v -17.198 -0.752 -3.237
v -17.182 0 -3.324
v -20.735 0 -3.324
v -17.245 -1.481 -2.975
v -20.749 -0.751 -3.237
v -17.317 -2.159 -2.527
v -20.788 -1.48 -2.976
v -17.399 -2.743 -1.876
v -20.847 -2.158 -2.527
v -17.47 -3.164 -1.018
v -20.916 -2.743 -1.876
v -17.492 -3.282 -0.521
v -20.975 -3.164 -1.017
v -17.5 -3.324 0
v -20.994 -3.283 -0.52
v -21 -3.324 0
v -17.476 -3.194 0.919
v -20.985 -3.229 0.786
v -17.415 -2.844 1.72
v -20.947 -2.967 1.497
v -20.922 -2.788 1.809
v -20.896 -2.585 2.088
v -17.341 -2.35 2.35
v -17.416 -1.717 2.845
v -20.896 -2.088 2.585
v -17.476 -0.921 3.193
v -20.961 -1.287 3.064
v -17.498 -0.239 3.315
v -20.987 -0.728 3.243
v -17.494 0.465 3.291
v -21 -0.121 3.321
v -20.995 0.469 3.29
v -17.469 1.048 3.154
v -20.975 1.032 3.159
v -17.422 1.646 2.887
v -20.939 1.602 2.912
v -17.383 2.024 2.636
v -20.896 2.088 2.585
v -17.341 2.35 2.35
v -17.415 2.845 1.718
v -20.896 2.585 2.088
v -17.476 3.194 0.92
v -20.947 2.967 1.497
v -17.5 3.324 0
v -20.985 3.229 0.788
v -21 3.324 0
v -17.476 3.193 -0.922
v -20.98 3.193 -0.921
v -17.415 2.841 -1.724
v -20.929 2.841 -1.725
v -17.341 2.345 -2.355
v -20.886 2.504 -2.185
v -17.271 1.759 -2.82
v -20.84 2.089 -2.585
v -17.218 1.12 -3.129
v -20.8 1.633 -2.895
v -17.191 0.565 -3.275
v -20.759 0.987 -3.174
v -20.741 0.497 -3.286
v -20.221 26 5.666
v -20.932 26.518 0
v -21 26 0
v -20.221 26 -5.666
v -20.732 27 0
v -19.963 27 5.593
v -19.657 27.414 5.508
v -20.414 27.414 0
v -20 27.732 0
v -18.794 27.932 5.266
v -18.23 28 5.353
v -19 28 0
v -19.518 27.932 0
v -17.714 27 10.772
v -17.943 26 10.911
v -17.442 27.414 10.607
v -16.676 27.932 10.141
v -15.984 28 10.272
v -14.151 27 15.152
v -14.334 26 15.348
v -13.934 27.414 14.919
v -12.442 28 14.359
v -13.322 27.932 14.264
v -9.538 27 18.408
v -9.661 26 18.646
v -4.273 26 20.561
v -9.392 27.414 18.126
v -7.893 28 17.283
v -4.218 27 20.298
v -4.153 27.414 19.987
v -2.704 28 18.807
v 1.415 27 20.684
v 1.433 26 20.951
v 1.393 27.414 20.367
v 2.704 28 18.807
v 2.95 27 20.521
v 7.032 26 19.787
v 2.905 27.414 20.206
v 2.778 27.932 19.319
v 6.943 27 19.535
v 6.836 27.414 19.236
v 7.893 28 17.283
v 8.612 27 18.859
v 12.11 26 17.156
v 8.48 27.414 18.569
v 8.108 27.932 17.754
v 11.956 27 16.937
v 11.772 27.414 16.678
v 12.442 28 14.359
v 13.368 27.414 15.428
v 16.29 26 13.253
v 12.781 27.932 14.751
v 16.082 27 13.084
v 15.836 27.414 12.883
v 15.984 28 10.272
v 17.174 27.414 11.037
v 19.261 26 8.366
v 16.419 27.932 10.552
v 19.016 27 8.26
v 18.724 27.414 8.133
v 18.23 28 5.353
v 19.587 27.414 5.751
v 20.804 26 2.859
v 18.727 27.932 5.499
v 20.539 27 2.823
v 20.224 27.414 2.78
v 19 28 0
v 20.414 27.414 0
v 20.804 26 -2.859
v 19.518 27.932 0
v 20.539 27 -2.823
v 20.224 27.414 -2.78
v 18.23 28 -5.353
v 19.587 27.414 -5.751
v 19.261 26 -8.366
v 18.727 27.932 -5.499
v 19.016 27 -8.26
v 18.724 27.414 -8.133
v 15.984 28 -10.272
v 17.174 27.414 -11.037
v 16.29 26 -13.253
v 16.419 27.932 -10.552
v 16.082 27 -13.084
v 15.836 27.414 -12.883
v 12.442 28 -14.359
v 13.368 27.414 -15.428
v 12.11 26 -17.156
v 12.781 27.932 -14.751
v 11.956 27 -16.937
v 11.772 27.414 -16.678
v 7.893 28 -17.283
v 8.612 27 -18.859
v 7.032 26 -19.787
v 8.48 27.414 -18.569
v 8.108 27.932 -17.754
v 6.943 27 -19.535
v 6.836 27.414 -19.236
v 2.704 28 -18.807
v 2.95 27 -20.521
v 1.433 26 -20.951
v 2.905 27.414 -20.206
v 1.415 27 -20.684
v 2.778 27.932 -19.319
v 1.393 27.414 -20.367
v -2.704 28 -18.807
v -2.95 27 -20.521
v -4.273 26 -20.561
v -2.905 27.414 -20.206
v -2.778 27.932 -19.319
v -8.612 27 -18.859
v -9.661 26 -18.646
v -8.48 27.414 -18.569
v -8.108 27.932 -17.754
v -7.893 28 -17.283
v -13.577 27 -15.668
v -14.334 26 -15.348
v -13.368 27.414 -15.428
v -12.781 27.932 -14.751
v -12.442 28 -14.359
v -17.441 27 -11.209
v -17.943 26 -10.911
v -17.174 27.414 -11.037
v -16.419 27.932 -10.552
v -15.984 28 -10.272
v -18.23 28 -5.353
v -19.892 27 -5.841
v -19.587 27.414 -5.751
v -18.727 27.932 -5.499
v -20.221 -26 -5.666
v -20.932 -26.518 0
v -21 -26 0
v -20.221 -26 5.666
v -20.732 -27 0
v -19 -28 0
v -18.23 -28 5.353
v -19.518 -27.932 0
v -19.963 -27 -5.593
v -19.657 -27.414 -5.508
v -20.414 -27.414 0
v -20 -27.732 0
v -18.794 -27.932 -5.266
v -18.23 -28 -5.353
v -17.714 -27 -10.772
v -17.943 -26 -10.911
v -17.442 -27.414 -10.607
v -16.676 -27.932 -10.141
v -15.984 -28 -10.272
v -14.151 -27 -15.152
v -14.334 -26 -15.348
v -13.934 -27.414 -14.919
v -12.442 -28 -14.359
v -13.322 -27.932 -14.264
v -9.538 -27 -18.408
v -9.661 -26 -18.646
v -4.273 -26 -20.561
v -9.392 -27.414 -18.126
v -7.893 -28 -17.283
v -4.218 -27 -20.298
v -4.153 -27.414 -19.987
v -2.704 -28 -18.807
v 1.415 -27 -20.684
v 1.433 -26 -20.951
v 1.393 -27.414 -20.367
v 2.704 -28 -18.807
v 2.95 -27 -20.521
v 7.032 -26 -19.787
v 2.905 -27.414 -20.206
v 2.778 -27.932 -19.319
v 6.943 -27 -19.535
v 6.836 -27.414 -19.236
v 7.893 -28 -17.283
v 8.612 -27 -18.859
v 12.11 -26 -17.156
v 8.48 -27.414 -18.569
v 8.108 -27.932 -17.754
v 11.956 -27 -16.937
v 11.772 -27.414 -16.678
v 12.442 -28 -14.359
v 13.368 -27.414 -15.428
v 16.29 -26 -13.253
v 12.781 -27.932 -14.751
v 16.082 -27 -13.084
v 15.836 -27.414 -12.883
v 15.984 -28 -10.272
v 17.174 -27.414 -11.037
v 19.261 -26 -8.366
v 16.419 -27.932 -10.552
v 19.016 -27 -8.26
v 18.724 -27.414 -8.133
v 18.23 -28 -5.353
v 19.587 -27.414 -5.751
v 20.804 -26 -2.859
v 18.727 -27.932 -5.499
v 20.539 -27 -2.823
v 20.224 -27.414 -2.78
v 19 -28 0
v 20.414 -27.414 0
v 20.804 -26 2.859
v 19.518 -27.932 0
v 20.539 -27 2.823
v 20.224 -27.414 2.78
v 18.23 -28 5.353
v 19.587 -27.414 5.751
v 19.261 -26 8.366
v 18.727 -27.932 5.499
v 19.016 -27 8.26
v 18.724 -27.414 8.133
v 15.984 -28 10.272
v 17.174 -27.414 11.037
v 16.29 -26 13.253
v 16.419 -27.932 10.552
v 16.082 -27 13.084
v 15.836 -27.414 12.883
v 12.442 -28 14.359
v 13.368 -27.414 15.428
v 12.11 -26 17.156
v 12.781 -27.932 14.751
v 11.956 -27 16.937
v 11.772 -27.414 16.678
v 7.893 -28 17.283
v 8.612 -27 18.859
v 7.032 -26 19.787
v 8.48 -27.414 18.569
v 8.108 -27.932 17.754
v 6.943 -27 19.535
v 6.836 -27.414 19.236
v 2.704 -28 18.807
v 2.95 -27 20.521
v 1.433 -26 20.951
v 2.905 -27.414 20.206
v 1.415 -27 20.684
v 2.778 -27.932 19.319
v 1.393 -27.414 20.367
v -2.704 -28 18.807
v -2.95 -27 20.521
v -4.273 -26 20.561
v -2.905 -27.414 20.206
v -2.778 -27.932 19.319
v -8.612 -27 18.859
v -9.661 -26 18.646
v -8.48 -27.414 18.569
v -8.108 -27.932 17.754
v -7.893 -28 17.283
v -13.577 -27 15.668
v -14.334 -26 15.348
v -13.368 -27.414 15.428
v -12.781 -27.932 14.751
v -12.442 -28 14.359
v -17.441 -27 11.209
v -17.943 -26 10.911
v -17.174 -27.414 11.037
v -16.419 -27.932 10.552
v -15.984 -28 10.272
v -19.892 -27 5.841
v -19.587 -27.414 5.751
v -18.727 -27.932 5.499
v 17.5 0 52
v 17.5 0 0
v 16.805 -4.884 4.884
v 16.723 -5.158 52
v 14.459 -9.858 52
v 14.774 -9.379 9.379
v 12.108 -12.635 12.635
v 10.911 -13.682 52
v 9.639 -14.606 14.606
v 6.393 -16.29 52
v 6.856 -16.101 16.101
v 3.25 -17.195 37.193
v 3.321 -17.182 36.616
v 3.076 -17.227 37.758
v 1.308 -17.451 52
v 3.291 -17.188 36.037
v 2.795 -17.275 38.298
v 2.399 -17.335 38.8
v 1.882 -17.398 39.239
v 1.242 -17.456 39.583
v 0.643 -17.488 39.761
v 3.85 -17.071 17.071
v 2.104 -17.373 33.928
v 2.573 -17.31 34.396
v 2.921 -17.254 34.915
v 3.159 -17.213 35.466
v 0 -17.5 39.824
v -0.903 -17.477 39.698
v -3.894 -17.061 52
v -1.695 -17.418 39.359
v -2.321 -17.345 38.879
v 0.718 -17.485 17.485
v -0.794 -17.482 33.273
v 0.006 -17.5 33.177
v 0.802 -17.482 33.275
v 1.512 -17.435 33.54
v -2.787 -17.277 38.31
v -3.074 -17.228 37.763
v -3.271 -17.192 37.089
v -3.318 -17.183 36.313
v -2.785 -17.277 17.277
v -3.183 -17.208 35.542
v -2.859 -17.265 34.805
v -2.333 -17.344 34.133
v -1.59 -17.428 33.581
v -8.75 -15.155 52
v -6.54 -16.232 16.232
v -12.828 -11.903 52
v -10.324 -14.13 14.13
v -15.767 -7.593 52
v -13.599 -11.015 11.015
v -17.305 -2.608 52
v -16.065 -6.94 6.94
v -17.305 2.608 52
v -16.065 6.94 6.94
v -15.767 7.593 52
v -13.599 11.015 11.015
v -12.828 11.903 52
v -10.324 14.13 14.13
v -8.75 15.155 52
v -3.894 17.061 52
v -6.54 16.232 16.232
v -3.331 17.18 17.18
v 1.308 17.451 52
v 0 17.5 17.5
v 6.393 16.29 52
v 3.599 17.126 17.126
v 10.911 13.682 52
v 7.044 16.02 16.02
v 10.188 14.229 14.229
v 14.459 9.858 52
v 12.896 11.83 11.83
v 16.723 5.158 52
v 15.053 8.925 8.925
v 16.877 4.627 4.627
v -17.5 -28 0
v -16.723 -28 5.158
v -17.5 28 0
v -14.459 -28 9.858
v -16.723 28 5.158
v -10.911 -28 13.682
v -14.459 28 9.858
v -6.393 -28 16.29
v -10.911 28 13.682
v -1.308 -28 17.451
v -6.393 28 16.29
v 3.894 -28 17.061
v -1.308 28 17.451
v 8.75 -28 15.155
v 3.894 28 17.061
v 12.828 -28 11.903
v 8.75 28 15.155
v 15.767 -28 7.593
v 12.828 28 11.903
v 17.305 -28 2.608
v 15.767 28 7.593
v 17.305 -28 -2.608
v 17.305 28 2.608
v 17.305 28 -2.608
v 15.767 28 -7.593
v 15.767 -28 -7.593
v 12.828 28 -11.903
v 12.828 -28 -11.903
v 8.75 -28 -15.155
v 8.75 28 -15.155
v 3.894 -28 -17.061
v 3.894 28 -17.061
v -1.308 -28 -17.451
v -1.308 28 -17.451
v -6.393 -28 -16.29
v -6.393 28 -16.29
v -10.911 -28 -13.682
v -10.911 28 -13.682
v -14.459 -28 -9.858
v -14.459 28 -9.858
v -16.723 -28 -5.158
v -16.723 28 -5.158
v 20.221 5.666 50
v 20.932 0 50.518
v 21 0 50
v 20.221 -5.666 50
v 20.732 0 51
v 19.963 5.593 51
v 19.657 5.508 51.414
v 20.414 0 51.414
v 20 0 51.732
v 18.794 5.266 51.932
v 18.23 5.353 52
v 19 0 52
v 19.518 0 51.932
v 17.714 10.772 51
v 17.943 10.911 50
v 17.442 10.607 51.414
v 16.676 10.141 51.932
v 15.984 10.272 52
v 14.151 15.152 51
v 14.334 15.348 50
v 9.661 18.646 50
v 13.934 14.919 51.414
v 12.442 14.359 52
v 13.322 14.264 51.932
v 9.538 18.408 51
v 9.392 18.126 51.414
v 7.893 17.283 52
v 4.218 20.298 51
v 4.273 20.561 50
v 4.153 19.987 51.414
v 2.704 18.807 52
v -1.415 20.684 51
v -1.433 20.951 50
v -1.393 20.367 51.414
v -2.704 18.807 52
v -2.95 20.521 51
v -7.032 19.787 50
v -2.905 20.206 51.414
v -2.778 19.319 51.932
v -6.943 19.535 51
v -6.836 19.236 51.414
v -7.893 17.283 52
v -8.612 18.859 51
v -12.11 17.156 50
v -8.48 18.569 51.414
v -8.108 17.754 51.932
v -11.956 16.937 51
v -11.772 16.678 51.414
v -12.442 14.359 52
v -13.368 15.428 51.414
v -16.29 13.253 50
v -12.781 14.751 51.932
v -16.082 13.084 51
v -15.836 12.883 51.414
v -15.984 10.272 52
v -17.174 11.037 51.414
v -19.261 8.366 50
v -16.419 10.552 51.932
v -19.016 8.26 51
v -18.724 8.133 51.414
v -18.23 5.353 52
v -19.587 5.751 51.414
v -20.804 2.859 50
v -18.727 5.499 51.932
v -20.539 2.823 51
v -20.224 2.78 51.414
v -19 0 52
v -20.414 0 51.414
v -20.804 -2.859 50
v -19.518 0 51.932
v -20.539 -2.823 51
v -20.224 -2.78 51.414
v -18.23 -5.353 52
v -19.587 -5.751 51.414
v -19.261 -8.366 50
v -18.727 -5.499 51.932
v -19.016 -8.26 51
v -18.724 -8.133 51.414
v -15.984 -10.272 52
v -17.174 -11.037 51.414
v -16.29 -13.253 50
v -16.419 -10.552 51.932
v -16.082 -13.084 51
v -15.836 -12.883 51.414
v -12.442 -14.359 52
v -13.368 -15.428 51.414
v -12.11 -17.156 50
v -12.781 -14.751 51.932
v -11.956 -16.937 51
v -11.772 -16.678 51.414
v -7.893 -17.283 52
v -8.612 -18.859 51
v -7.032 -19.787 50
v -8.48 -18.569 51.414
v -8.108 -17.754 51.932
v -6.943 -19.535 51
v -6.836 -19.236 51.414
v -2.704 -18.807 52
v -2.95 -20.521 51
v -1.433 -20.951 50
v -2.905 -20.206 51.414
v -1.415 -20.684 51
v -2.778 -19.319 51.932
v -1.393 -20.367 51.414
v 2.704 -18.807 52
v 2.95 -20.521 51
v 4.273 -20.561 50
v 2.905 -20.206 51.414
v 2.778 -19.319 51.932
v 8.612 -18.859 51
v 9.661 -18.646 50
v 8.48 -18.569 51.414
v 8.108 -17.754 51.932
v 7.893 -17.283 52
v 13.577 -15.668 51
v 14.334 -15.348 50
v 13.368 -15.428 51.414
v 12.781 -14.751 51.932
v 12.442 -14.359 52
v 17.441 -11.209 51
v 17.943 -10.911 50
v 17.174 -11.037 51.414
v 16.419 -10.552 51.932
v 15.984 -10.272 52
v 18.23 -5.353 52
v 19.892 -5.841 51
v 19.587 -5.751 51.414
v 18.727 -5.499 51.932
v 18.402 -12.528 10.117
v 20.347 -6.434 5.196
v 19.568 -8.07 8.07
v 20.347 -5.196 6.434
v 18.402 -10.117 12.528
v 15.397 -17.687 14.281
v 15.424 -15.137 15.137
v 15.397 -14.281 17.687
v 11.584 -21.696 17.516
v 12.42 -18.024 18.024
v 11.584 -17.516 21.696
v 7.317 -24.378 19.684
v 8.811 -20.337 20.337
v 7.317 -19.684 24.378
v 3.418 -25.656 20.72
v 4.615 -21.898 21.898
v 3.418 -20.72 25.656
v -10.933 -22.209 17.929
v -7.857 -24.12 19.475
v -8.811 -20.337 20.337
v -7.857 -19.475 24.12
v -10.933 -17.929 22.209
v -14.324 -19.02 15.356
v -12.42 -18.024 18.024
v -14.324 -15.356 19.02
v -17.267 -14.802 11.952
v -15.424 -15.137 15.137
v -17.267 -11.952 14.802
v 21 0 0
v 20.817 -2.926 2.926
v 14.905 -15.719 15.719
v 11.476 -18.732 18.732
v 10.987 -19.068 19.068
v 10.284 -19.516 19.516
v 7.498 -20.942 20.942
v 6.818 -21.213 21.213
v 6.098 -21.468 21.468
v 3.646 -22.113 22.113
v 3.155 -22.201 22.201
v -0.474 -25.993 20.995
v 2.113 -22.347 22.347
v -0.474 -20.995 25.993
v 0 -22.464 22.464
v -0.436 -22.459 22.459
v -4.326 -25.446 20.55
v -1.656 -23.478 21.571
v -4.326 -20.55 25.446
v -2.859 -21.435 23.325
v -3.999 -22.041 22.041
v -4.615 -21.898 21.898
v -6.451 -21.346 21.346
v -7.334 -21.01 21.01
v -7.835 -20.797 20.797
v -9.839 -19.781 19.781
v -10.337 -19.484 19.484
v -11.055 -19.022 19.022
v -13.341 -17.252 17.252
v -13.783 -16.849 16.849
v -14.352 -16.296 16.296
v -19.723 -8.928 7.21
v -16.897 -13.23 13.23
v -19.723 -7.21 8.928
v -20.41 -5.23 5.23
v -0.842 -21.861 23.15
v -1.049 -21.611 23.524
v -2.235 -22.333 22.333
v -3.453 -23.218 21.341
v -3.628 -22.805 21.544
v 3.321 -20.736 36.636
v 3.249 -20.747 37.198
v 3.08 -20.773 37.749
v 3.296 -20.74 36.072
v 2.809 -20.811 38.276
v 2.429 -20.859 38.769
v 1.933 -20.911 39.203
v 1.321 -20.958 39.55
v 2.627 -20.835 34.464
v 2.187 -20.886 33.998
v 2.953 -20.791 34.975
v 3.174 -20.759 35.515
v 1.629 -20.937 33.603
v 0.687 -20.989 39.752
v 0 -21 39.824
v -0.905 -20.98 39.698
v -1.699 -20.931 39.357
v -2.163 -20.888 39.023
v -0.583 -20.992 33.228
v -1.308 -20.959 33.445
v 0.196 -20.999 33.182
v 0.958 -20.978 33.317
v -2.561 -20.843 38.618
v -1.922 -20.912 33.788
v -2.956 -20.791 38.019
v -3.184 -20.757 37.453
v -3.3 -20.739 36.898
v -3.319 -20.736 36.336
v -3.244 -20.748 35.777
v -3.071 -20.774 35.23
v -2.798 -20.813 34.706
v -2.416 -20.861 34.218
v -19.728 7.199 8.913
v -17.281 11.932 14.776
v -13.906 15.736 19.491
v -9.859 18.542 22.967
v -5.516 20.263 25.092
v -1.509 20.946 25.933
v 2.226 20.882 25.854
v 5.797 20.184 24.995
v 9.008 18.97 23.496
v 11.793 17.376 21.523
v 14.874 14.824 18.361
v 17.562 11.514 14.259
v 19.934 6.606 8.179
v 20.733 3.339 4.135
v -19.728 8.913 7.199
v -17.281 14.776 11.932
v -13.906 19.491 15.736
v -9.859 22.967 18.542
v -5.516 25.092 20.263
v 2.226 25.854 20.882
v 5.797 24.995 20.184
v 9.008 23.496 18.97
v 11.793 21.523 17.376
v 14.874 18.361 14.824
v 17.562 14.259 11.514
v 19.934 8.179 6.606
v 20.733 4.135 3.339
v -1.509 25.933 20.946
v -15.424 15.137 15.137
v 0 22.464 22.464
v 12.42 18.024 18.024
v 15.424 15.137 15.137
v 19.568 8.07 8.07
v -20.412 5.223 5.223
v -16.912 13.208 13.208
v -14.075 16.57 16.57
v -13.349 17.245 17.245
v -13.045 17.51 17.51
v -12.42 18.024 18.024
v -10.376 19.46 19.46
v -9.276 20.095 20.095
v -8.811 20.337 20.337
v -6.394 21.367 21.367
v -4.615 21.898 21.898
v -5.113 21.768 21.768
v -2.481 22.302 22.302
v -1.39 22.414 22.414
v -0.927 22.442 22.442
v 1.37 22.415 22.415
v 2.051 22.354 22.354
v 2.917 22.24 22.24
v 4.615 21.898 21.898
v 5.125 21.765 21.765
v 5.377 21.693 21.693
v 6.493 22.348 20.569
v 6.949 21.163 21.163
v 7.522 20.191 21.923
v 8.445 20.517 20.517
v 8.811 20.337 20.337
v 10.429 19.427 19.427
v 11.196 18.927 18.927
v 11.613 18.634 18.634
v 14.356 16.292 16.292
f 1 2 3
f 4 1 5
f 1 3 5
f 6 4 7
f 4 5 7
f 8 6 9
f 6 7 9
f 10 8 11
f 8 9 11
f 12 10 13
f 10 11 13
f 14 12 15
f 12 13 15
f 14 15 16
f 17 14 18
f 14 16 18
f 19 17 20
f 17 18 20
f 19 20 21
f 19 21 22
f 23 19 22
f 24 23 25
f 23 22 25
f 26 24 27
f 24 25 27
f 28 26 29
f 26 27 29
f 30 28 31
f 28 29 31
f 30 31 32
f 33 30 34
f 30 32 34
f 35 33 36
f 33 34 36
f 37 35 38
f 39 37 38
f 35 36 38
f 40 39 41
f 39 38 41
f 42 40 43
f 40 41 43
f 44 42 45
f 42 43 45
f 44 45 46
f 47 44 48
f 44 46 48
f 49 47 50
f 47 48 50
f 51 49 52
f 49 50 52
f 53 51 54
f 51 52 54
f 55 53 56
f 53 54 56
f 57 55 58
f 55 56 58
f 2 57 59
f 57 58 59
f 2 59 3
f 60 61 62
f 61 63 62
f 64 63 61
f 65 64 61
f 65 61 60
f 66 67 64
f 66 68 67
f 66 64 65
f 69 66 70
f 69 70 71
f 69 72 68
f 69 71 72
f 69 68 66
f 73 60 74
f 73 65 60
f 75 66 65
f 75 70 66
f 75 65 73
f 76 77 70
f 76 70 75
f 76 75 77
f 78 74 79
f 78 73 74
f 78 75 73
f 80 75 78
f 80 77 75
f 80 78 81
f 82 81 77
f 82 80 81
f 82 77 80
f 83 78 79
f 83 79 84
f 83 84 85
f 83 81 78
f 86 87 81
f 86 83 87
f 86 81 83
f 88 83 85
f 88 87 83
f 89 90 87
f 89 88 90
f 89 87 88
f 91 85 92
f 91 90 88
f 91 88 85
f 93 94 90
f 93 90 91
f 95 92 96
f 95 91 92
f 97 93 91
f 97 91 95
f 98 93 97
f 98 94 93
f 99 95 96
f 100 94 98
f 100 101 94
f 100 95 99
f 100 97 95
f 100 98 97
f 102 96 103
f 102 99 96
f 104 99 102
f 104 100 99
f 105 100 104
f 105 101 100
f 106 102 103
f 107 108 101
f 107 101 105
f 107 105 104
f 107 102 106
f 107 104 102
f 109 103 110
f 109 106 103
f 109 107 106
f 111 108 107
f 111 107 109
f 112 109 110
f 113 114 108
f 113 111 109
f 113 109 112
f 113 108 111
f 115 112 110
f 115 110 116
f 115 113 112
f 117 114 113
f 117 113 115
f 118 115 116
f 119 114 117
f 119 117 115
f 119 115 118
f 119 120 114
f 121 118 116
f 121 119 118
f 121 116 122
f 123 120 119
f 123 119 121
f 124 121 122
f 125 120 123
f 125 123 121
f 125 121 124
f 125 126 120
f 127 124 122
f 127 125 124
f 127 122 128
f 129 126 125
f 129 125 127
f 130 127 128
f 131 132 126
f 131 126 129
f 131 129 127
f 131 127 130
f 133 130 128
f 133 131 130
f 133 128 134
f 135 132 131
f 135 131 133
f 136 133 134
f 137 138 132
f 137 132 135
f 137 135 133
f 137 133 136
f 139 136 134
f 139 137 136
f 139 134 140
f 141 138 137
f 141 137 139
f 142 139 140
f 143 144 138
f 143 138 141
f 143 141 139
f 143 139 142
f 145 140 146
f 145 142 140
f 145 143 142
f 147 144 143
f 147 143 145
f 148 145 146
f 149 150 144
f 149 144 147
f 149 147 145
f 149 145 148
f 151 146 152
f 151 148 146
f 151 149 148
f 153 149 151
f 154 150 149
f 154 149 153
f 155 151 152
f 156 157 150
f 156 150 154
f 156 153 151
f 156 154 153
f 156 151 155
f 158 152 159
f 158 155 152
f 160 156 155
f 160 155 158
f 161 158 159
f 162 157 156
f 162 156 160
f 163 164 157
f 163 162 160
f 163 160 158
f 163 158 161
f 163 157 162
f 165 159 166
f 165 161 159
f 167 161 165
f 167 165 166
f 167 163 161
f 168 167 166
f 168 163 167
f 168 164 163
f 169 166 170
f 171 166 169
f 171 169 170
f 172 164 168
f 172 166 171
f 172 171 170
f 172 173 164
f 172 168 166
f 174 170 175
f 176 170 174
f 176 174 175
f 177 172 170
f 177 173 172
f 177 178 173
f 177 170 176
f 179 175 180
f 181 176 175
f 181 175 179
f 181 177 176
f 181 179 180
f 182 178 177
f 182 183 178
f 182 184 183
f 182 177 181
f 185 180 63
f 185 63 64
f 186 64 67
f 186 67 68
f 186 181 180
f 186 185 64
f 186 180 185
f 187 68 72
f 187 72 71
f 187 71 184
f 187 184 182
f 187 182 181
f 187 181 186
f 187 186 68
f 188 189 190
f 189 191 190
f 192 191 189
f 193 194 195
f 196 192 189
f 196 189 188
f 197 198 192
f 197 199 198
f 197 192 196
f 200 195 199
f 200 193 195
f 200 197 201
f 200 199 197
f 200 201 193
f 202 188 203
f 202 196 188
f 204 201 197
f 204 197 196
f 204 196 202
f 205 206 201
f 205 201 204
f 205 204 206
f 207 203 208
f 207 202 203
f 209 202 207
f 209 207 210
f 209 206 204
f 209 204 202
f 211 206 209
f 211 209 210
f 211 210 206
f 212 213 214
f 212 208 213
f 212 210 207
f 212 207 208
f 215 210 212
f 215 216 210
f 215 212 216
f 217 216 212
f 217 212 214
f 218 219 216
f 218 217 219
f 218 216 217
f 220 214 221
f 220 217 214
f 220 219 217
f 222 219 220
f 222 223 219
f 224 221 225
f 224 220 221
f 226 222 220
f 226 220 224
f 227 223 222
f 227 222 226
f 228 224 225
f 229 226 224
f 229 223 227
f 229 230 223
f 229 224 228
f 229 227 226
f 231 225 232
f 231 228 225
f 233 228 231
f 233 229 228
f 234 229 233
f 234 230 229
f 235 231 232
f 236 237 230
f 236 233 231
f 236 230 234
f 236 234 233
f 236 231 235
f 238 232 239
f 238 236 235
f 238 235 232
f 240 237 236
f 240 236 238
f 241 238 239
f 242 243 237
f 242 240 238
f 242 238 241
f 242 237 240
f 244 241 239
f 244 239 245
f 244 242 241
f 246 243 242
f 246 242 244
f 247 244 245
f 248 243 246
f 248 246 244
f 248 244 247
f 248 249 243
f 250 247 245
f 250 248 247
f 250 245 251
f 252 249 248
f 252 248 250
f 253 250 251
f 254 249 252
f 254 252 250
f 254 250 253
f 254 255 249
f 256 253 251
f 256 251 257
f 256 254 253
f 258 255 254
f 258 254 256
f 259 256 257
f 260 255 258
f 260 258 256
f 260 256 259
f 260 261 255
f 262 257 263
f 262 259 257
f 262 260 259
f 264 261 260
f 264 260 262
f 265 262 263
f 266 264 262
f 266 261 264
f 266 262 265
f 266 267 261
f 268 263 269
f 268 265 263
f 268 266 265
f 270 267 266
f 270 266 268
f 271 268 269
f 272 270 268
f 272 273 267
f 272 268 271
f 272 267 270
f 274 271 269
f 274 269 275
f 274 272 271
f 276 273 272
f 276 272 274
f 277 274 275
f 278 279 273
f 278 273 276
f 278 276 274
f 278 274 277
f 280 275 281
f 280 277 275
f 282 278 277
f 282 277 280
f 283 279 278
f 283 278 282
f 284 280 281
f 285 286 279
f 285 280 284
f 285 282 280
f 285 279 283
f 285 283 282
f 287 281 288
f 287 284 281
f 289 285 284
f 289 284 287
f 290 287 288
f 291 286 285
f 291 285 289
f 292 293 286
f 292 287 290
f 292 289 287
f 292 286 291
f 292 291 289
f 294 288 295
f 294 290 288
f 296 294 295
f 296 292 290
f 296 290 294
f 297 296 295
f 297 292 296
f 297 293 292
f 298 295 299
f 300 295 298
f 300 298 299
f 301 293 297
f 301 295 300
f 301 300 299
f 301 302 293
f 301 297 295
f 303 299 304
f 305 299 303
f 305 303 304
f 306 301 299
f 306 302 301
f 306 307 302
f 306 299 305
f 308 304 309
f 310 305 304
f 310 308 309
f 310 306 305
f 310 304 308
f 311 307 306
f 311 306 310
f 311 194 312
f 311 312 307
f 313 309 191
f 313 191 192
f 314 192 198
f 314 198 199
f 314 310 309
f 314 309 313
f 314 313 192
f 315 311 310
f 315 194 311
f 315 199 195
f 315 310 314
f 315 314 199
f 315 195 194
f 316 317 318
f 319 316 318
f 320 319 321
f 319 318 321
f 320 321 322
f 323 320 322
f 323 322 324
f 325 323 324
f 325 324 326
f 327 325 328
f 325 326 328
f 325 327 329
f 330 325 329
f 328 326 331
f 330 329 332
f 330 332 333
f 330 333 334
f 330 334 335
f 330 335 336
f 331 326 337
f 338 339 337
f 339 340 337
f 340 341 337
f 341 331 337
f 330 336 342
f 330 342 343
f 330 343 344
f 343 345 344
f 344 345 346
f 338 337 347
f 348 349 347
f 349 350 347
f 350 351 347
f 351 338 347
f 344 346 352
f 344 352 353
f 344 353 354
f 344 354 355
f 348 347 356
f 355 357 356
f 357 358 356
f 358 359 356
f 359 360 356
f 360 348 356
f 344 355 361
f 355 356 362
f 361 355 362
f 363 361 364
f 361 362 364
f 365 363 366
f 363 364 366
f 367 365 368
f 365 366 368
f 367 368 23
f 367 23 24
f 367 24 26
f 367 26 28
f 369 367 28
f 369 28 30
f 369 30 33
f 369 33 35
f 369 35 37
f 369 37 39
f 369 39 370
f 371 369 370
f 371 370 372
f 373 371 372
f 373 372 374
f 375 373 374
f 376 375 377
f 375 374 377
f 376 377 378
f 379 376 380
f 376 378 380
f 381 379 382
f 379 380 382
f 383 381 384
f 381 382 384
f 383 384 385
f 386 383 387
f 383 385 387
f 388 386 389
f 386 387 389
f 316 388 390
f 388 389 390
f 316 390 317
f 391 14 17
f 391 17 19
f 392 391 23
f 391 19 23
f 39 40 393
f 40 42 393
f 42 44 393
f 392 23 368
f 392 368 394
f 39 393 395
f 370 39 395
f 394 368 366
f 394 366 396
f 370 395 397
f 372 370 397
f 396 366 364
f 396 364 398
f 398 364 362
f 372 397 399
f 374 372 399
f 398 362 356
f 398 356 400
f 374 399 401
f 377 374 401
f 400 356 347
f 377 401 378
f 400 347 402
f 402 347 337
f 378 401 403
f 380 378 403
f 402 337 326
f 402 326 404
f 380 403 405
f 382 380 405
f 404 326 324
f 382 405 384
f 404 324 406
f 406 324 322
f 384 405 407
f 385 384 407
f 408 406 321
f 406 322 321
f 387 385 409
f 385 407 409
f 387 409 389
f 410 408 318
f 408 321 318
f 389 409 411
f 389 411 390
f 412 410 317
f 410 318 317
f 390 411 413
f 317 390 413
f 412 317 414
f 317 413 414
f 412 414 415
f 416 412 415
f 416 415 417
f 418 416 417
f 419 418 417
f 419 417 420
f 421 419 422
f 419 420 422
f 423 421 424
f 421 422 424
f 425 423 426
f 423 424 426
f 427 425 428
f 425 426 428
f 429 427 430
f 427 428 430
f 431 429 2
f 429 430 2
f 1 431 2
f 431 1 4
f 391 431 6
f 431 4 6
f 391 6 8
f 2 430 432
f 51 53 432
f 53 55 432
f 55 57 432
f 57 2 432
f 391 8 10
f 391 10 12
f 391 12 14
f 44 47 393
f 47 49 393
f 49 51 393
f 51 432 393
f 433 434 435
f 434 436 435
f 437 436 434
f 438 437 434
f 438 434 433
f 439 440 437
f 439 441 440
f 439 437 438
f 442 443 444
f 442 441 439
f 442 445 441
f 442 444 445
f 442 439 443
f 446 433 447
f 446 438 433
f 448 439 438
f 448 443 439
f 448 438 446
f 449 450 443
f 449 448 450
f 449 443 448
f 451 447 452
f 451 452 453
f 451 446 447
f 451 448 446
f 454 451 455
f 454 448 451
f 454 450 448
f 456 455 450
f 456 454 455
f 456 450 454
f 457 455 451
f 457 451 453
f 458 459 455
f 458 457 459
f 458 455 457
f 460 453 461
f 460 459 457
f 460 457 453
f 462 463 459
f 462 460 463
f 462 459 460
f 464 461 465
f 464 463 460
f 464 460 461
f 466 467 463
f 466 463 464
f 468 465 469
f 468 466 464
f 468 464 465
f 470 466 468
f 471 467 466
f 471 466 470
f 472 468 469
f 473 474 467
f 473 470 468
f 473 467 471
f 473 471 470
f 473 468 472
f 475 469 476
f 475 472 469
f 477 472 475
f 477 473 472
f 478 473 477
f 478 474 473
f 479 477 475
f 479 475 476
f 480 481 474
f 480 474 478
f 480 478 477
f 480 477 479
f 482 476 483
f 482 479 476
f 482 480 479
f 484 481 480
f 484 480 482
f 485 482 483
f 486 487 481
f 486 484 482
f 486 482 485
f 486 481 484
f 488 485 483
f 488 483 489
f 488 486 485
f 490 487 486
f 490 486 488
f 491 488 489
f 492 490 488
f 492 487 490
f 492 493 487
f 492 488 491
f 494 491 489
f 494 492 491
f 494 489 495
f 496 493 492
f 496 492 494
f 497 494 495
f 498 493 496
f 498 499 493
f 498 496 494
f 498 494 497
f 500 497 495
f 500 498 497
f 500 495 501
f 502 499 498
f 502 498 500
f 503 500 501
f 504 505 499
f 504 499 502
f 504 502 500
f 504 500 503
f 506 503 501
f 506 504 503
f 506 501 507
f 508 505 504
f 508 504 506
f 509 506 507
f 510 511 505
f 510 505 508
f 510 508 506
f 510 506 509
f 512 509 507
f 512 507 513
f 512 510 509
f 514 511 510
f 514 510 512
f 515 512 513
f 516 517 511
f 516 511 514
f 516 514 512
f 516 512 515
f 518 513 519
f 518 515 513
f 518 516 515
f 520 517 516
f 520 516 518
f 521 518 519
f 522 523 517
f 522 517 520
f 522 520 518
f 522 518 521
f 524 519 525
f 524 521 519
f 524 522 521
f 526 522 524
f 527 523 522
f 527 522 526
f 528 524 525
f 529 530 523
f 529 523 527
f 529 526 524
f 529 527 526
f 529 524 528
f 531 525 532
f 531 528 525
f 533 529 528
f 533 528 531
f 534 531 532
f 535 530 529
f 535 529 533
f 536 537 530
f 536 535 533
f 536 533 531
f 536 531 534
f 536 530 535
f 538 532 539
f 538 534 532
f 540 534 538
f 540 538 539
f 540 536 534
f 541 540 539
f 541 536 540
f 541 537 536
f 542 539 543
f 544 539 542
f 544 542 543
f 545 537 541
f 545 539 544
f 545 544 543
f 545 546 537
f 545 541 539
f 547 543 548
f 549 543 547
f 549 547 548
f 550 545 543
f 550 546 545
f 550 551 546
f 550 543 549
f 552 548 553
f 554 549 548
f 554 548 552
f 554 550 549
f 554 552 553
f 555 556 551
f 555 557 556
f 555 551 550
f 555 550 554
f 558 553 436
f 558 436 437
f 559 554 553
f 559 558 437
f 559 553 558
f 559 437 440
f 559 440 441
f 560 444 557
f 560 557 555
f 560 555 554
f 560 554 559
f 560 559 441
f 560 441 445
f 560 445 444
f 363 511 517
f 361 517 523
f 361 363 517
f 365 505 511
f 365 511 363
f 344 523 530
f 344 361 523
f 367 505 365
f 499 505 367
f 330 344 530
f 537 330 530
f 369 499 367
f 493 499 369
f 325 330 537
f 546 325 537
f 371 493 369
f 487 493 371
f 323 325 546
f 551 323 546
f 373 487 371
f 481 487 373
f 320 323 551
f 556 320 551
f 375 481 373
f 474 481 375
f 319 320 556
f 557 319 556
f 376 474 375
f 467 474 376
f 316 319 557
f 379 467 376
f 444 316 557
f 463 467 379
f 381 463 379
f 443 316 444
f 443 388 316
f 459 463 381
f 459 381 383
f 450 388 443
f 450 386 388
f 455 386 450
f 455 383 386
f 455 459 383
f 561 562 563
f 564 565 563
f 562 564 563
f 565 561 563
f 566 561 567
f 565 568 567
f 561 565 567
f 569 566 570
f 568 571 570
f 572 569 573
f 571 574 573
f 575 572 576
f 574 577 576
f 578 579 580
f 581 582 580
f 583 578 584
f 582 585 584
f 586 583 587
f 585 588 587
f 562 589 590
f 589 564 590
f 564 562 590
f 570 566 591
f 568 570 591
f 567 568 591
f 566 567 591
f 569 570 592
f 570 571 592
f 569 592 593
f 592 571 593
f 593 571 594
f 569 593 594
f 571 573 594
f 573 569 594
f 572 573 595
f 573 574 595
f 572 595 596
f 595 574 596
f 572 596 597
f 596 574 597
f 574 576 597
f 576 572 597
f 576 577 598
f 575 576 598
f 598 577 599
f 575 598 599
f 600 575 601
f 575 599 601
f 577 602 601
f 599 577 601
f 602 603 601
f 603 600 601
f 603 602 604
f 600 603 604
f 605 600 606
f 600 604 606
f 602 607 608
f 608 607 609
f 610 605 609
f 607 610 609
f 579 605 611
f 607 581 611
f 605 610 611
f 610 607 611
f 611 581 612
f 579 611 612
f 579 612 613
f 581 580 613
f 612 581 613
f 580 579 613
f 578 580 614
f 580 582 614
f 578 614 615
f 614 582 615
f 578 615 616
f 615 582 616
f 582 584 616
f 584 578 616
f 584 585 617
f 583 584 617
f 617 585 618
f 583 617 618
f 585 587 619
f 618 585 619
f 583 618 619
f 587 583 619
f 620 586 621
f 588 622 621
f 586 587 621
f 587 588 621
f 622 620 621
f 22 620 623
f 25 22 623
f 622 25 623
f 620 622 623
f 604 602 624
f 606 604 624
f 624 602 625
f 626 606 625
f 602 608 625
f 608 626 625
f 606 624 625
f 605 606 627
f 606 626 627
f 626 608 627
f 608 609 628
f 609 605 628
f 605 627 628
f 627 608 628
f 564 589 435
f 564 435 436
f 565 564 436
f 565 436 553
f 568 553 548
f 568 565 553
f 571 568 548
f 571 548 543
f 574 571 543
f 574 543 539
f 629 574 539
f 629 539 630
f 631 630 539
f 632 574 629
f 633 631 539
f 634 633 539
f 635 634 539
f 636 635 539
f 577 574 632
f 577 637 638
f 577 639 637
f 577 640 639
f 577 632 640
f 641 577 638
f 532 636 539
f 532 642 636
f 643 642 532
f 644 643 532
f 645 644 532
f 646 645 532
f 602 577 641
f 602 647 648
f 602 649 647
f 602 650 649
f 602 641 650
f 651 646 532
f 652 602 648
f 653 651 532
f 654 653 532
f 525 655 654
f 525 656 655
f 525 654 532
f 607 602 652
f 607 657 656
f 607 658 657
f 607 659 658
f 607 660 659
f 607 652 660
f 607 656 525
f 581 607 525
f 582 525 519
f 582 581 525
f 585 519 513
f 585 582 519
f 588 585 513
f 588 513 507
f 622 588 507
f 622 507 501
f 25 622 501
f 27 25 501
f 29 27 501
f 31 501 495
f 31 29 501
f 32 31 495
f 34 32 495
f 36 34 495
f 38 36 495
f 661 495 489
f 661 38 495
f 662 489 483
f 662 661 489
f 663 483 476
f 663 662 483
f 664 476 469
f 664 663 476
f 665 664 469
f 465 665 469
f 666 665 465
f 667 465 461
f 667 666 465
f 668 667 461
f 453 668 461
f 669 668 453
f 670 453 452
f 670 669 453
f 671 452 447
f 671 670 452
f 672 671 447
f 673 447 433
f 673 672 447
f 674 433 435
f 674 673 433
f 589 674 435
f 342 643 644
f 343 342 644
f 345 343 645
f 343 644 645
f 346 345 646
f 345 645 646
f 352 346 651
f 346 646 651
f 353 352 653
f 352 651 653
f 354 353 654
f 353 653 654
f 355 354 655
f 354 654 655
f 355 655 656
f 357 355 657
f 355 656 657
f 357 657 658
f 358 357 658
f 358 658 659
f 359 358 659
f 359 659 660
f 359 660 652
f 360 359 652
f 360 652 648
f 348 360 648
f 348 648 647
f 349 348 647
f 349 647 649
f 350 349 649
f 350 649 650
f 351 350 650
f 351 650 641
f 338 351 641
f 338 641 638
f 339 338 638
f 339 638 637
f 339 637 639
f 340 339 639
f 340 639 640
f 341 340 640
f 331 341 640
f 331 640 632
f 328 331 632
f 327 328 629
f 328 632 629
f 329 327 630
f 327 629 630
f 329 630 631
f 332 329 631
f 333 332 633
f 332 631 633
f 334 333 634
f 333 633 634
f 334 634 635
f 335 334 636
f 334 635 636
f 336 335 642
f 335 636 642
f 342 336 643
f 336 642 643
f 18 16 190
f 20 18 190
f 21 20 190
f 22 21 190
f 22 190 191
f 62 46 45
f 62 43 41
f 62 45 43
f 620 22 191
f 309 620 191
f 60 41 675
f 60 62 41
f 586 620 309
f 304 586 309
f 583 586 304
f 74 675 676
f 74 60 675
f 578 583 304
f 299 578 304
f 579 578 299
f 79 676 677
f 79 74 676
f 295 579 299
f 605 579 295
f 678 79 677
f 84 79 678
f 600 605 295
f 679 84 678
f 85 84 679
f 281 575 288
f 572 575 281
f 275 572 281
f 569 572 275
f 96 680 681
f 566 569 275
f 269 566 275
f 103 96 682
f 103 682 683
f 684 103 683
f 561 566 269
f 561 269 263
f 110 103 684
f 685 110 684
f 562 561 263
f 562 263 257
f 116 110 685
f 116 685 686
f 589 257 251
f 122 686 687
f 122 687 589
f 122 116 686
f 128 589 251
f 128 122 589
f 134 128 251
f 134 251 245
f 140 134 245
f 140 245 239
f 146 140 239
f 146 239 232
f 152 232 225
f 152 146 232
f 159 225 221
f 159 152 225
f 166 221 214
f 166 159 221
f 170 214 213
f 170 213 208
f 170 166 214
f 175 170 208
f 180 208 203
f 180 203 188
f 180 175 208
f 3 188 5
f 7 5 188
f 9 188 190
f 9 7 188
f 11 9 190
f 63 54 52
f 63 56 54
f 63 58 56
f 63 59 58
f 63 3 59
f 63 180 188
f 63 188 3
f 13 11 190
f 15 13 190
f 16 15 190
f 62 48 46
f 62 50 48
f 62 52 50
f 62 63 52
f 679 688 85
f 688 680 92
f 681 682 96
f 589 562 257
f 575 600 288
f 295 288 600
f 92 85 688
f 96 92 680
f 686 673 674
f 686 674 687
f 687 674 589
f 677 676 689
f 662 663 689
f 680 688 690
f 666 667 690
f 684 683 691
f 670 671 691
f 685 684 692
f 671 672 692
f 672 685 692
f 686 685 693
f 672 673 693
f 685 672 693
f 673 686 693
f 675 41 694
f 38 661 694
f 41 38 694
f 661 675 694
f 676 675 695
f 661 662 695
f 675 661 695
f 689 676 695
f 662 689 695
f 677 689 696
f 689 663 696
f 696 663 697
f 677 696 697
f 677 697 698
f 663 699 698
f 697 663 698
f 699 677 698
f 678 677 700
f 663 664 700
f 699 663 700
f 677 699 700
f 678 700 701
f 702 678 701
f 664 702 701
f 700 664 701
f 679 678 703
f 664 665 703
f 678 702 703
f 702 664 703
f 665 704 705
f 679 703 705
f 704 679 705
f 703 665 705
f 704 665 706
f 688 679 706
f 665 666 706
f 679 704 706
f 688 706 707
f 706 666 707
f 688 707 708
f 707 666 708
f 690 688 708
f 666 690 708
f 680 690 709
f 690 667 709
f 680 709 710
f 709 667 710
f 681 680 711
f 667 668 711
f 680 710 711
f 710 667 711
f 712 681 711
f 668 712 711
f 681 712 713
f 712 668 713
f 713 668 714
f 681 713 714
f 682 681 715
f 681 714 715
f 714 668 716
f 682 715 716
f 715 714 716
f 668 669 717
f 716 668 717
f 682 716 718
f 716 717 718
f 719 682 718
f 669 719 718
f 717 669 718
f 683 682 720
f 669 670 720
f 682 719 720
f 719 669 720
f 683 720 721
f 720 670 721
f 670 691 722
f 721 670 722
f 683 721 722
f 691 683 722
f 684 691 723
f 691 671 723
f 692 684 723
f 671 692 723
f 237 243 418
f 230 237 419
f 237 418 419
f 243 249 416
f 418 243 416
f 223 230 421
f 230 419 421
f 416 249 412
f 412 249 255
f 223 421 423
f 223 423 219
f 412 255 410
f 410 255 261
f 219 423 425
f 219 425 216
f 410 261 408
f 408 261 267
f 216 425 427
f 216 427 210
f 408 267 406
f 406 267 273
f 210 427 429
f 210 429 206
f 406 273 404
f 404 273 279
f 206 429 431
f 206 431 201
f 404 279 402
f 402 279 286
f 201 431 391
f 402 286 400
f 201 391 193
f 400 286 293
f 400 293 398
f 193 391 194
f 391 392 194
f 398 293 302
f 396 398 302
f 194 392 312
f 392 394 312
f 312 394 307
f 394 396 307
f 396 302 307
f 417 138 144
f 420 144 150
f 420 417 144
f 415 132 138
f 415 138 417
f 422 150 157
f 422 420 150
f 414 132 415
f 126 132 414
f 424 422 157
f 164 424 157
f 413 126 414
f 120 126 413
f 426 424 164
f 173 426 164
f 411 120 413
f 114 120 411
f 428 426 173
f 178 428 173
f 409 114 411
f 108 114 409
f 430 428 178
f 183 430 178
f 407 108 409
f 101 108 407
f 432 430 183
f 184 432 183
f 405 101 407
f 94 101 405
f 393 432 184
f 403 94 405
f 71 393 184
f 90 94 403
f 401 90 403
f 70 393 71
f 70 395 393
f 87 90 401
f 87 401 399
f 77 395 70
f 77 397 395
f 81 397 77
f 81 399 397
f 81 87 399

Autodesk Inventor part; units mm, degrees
ref_plane "XY Plane" through (0, 0, 0) normal (0, 0, 1) x (1, 0, 0)
sketch "Sketch1" plane through (0, 0, 0) normal (0, 0, 1) x (1, 0, 0)
  circle A0 centre (0, 0) radius 17.5
  circle A1 centre (0, 0) radius 21
  dimension "d1" = 42
  dimension "d2" = 35
extrude "Extrusion1" add sketch "Sketch1" along normal blind 52 contours A0 | A1
sketch "Sketch2" plane through (0, 0, 0) normal (0, 1, 0) x (-1, 0, 0)
  circle A0 centre (0, 0) radius 17.5
  circle A1 centre (0, 0) radius 21
  dimension "d5" = 35
  dimension "d6" = 42
extrude "Extrusion2" add sketch "Sketch2" along normal mid plane 56 contours A0 | A1
extrude "Extrusion3" cut sketch "Sketch2" against normal up to surface (56 mm away) from surface at 28 contours A0
extrude "Extrusion4" cut sketch "Sketch1" along normal up to surface (52 mm away) contours A0
fillet "Fillet1" radius 5 2 edges at (0, 21, 21) (0, -21, 21)
hole "Hole1" at (0, 0, 0) direction (-1, 0, 0) diameter 6.647 end through all thread size "M8x1.25" class "6H" standard "ISO Metric profile"
ref_plane "Work Plane1" through (0, 0, 36.5) normal (0, 0, 1) x (1, 0, 0)
hole "Hole2" at (0, 0, 36.5) direction (0, -1, 0) diameter 6.647 end through all thread size "M8x1.25" class "6H" standard "ISO Metric profile"
fillet "Fillet2" radius 2 3 edges at (21, 28, 0) (-21, 0, 52) (21, -28, 0)
equation "\"d5\" = d2"
equation "\"d6\" = d1"
equation "\"d23\" = -0.5 * d3 + 0.25 * d1"
equation "\"d3\" = 52"
properties part number "L10-6" material "Aluminium Cast"
